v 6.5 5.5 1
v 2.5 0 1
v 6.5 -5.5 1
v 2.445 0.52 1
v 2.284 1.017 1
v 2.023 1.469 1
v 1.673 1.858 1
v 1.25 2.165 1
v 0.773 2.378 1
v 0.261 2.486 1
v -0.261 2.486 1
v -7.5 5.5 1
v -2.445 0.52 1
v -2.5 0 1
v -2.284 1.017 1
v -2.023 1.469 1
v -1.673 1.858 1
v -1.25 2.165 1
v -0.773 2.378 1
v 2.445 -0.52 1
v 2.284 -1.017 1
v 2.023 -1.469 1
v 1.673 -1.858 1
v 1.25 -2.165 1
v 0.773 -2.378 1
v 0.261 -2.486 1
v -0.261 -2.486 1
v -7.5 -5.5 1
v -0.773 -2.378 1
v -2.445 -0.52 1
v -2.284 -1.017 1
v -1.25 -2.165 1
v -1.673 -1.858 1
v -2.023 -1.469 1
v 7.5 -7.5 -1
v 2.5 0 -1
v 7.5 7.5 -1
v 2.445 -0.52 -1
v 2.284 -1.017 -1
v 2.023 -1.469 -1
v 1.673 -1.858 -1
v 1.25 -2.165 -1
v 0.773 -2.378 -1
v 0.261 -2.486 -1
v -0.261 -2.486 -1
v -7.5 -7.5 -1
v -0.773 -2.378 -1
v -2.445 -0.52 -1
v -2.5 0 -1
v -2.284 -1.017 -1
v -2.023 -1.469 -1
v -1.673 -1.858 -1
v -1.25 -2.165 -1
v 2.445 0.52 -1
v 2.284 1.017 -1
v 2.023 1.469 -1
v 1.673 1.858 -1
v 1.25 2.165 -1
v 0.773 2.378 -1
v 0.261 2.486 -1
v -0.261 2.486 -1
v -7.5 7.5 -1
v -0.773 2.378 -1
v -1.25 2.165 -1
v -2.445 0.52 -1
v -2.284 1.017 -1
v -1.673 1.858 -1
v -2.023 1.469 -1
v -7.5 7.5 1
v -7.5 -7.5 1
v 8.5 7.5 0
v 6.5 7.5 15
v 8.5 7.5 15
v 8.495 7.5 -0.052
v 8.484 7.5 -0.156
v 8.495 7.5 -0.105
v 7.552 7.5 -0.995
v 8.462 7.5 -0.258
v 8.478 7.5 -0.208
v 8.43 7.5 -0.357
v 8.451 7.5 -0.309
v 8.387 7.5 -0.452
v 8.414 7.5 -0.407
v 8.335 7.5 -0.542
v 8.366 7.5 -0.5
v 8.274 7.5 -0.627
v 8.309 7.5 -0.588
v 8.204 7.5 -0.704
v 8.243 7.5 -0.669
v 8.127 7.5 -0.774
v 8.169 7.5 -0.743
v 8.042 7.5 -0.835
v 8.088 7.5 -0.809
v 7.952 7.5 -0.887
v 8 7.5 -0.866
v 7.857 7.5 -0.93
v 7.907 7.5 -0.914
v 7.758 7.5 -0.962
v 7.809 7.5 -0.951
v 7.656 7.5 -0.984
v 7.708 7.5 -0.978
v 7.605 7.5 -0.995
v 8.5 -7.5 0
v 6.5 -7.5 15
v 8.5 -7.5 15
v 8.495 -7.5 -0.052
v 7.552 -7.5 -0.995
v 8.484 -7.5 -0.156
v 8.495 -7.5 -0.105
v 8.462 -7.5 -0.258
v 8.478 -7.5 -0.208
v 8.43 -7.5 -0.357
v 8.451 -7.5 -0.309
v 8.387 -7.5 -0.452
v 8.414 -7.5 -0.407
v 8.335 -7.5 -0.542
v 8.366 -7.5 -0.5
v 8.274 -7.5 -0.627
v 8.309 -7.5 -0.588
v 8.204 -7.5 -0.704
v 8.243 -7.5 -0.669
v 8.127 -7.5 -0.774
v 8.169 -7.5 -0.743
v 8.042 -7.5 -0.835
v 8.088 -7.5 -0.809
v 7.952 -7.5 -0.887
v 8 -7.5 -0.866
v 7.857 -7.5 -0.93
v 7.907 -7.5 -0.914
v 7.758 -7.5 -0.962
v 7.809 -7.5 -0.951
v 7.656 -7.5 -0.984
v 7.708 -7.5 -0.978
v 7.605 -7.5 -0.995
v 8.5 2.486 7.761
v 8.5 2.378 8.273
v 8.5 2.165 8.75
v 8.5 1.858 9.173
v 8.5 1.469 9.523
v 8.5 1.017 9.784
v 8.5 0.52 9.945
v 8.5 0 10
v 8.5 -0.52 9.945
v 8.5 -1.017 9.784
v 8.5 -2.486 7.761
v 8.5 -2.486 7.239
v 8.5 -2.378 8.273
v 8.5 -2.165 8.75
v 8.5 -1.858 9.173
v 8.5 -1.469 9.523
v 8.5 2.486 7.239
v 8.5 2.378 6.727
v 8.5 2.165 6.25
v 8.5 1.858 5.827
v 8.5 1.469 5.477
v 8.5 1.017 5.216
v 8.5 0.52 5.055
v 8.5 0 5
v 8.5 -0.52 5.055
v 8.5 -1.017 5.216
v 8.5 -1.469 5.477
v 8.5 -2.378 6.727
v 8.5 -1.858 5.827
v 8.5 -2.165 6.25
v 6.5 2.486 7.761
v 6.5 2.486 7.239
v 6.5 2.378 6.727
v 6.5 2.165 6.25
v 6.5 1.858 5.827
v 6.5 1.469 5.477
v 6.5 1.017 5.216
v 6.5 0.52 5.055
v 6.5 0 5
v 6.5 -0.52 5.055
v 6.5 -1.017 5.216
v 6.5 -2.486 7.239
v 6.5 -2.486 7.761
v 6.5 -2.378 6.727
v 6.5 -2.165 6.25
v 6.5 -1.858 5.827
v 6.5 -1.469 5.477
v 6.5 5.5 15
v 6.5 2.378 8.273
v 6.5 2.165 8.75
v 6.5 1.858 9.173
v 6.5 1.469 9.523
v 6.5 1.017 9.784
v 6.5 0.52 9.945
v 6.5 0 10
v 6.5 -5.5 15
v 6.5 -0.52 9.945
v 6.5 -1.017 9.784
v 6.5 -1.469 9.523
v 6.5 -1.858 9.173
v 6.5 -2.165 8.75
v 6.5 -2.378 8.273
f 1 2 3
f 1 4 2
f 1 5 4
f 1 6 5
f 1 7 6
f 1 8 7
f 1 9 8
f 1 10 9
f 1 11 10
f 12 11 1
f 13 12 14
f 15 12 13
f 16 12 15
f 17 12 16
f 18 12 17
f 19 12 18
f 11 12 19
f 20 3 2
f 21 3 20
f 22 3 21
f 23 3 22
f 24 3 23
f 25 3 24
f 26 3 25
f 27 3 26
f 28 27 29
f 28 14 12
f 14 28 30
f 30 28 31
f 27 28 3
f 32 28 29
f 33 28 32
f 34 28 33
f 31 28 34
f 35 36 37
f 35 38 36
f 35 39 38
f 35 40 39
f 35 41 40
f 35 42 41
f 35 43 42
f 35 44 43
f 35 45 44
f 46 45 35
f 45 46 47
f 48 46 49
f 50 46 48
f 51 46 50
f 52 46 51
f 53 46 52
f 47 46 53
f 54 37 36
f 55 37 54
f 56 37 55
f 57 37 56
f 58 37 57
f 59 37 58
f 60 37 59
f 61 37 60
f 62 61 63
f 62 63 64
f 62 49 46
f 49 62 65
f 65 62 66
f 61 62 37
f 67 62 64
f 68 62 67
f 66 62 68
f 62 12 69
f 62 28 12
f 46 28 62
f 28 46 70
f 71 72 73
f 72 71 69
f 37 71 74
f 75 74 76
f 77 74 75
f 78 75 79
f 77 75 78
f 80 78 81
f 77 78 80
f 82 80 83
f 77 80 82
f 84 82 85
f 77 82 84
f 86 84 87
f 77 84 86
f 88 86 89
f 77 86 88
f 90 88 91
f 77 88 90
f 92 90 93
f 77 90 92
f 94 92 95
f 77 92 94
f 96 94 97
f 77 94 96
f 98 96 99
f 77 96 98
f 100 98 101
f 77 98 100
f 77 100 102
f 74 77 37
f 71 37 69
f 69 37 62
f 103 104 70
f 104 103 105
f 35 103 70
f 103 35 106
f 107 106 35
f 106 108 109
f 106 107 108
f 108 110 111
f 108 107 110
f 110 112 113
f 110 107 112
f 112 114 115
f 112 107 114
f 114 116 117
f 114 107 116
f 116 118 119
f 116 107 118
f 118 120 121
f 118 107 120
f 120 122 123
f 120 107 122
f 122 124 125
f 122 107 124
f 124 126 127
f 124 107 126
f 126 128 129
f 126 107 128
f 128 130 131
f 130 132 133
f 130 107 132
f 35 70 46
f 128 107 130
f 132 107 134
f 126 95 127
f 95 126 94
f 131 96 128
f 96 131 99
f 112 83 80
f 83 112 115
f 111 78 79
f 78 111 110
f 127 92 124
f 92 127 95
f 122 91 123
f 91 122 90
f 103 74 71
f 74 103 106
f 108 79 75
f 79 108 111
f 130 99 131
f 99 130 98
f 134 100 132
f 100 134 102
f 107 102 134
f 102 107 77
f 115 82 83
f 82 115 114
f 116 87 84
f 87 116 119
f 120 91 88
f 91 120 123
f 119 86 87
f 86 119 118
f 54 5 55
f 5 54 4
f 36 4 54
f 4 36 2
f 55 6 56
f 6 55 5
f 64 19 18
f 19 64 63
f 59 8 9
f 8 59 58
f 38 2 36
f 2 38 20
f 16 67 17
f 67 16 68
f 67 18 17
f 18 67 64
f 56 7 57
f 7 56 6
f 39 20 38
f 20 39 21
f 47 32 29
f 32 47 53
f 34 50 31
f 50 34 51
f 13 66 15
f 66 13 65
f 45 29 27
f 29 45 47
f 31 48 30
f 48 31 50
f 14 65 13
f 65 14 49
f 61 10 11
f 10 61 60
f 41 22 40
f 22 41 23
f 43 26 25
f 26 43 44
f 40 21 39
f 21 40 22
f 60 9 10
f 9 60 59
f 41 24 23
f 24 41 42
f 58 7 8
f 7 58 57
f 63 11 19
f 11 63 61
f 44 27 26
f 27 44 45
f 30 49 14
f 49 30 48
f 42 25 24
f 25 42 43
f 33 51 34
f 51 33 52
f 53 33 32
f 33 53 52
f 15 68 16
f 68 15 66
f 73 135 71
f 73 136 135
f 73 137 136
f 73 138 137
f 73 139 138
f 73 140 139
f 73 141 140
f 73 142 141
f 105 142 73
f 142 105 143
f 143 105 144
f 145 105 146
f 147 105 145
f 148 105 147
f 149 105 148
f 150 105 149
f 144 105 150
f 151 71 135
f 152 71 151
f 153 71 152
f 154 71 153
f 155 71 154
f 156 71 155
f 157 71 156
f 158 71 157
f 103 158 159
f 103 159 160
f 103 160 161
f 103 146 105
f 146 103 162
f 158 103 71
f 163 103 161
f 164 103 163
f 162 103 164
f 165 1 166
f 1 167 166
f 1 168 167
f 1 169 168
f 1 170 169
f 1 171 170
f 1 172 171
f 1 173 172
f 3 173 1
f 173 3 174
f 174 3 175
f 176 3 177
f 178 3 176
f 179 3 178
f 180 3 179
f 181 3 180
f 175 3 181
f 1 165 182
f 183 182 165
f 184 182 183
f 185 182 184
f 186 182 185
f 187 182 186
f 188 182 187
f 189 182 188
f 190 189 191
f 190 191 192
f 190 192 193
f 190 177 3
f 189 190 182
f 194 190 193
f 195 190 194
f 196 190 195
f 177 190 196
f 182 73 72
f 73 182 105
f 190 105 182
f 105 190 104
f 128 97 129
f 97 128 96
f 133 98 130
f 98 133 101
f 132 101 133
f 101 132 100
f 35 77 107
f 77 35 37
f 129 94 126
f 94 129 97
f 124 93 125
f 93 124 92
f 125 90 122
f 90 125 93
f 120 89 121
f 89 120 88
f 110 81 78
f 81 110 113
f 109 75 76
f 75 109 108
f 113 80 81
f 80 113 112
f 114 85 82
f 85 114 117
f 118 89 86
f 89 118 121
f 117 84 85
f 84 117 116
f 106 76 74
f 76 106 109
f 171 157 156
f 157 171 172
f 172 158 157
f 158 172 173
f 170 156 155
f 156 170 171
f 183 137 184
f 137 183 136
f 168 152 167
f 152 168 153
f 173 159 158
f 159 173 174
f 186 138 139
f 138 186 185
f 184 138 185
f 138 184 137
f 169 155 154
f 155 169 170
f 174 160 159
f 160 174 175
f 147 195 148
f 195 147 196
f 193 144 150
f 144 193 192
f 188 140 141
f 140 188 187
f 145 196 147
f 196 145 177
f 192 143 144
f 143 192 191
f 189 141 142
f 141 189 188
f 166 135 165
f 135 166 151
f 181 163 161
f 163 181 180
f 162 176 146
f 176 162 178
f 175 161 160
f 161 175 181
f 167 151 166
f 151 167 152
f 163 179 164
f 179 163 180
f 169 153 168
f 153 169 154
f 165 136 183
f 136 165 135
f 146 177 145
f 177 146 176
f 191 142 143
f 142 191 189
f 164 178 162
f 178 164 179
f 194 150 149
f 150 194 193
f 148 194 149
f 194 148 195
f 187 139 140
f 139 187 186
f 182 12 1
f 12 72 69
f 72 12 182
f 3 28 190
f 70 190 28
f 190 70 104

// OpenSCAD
/////---Variables----//////

br_width = 15;
br_length = 15;
br_thickness = 2;
br_hole = 5;
br_support = "yes"; //[yes,no]
br_dual = "yes"; //[yes,no]

/////---Render---/////

bracket();

//cube([width,length,thickness],center=true);
//translate([width/2,0,length/2])rotate([0,90,0])cube([width,length,thickness],center=true);
//translate([width/2,0,0])rotate([90,0,0])cylinder(d=thickness,h=length,center=true, $fn=30);

/////---Modules---/////

module plate(w,l,h)
{
   difference()
   {
       union()
       {
           cube([br_width,br_length,br_thickness],center=true); 
           translate([br_width/2,0,0])rotate([90,0,0])cylinder(d=br_thickness,h=br_length,center=true, $fn=30);
           
       }
       cylinder(d=br_hole,h=br_thickness+1,center=true,$fn=30);
   }
}

module bracket()
{
    plate(br_width,br_length,br_thickness);
translate([br_width/2,0,br_width/2])rotate([0,90,0])plate(br_width,br_length,br_thickness);

    if (br_support == "yes")
    {
        hull()
        {
            translate([(br_width/2)-(br_thickness/2),(br_length/2)-(br_thickness/2),0])cube(br_thickness,center=true);
            translate([(-br_width/2)+(br_thickness/2),(br_length/2)-(br_thickness/2),0])cube(br_thickness,center=true);
            translate([br_width/2,(br_length/2)-(br_thickness/2),(br_width)-(br_thickness/2)])cube(br_thickness,center=true);
        }
    }
    mirror([0,1,0])
    {
       if (br_dual == "yes")
    {
        hull()
        {
            translate([(br_width/2)-(br_thickness/2),(br_length/2)-(br_thickness/2),0])cube(br_thickness,center=true);
            translate([(-br_width/2)+(br_thickness/2),(br_length/2)-(br_thickness/2),0])cube(br_thickness,center=true);
            translate([br_width/2,(br_length/2)-(br_thickness/2),(br_width)-(br_thickness/2)])cube(br_thickness,center=true);
        }
    } 
    }
}
